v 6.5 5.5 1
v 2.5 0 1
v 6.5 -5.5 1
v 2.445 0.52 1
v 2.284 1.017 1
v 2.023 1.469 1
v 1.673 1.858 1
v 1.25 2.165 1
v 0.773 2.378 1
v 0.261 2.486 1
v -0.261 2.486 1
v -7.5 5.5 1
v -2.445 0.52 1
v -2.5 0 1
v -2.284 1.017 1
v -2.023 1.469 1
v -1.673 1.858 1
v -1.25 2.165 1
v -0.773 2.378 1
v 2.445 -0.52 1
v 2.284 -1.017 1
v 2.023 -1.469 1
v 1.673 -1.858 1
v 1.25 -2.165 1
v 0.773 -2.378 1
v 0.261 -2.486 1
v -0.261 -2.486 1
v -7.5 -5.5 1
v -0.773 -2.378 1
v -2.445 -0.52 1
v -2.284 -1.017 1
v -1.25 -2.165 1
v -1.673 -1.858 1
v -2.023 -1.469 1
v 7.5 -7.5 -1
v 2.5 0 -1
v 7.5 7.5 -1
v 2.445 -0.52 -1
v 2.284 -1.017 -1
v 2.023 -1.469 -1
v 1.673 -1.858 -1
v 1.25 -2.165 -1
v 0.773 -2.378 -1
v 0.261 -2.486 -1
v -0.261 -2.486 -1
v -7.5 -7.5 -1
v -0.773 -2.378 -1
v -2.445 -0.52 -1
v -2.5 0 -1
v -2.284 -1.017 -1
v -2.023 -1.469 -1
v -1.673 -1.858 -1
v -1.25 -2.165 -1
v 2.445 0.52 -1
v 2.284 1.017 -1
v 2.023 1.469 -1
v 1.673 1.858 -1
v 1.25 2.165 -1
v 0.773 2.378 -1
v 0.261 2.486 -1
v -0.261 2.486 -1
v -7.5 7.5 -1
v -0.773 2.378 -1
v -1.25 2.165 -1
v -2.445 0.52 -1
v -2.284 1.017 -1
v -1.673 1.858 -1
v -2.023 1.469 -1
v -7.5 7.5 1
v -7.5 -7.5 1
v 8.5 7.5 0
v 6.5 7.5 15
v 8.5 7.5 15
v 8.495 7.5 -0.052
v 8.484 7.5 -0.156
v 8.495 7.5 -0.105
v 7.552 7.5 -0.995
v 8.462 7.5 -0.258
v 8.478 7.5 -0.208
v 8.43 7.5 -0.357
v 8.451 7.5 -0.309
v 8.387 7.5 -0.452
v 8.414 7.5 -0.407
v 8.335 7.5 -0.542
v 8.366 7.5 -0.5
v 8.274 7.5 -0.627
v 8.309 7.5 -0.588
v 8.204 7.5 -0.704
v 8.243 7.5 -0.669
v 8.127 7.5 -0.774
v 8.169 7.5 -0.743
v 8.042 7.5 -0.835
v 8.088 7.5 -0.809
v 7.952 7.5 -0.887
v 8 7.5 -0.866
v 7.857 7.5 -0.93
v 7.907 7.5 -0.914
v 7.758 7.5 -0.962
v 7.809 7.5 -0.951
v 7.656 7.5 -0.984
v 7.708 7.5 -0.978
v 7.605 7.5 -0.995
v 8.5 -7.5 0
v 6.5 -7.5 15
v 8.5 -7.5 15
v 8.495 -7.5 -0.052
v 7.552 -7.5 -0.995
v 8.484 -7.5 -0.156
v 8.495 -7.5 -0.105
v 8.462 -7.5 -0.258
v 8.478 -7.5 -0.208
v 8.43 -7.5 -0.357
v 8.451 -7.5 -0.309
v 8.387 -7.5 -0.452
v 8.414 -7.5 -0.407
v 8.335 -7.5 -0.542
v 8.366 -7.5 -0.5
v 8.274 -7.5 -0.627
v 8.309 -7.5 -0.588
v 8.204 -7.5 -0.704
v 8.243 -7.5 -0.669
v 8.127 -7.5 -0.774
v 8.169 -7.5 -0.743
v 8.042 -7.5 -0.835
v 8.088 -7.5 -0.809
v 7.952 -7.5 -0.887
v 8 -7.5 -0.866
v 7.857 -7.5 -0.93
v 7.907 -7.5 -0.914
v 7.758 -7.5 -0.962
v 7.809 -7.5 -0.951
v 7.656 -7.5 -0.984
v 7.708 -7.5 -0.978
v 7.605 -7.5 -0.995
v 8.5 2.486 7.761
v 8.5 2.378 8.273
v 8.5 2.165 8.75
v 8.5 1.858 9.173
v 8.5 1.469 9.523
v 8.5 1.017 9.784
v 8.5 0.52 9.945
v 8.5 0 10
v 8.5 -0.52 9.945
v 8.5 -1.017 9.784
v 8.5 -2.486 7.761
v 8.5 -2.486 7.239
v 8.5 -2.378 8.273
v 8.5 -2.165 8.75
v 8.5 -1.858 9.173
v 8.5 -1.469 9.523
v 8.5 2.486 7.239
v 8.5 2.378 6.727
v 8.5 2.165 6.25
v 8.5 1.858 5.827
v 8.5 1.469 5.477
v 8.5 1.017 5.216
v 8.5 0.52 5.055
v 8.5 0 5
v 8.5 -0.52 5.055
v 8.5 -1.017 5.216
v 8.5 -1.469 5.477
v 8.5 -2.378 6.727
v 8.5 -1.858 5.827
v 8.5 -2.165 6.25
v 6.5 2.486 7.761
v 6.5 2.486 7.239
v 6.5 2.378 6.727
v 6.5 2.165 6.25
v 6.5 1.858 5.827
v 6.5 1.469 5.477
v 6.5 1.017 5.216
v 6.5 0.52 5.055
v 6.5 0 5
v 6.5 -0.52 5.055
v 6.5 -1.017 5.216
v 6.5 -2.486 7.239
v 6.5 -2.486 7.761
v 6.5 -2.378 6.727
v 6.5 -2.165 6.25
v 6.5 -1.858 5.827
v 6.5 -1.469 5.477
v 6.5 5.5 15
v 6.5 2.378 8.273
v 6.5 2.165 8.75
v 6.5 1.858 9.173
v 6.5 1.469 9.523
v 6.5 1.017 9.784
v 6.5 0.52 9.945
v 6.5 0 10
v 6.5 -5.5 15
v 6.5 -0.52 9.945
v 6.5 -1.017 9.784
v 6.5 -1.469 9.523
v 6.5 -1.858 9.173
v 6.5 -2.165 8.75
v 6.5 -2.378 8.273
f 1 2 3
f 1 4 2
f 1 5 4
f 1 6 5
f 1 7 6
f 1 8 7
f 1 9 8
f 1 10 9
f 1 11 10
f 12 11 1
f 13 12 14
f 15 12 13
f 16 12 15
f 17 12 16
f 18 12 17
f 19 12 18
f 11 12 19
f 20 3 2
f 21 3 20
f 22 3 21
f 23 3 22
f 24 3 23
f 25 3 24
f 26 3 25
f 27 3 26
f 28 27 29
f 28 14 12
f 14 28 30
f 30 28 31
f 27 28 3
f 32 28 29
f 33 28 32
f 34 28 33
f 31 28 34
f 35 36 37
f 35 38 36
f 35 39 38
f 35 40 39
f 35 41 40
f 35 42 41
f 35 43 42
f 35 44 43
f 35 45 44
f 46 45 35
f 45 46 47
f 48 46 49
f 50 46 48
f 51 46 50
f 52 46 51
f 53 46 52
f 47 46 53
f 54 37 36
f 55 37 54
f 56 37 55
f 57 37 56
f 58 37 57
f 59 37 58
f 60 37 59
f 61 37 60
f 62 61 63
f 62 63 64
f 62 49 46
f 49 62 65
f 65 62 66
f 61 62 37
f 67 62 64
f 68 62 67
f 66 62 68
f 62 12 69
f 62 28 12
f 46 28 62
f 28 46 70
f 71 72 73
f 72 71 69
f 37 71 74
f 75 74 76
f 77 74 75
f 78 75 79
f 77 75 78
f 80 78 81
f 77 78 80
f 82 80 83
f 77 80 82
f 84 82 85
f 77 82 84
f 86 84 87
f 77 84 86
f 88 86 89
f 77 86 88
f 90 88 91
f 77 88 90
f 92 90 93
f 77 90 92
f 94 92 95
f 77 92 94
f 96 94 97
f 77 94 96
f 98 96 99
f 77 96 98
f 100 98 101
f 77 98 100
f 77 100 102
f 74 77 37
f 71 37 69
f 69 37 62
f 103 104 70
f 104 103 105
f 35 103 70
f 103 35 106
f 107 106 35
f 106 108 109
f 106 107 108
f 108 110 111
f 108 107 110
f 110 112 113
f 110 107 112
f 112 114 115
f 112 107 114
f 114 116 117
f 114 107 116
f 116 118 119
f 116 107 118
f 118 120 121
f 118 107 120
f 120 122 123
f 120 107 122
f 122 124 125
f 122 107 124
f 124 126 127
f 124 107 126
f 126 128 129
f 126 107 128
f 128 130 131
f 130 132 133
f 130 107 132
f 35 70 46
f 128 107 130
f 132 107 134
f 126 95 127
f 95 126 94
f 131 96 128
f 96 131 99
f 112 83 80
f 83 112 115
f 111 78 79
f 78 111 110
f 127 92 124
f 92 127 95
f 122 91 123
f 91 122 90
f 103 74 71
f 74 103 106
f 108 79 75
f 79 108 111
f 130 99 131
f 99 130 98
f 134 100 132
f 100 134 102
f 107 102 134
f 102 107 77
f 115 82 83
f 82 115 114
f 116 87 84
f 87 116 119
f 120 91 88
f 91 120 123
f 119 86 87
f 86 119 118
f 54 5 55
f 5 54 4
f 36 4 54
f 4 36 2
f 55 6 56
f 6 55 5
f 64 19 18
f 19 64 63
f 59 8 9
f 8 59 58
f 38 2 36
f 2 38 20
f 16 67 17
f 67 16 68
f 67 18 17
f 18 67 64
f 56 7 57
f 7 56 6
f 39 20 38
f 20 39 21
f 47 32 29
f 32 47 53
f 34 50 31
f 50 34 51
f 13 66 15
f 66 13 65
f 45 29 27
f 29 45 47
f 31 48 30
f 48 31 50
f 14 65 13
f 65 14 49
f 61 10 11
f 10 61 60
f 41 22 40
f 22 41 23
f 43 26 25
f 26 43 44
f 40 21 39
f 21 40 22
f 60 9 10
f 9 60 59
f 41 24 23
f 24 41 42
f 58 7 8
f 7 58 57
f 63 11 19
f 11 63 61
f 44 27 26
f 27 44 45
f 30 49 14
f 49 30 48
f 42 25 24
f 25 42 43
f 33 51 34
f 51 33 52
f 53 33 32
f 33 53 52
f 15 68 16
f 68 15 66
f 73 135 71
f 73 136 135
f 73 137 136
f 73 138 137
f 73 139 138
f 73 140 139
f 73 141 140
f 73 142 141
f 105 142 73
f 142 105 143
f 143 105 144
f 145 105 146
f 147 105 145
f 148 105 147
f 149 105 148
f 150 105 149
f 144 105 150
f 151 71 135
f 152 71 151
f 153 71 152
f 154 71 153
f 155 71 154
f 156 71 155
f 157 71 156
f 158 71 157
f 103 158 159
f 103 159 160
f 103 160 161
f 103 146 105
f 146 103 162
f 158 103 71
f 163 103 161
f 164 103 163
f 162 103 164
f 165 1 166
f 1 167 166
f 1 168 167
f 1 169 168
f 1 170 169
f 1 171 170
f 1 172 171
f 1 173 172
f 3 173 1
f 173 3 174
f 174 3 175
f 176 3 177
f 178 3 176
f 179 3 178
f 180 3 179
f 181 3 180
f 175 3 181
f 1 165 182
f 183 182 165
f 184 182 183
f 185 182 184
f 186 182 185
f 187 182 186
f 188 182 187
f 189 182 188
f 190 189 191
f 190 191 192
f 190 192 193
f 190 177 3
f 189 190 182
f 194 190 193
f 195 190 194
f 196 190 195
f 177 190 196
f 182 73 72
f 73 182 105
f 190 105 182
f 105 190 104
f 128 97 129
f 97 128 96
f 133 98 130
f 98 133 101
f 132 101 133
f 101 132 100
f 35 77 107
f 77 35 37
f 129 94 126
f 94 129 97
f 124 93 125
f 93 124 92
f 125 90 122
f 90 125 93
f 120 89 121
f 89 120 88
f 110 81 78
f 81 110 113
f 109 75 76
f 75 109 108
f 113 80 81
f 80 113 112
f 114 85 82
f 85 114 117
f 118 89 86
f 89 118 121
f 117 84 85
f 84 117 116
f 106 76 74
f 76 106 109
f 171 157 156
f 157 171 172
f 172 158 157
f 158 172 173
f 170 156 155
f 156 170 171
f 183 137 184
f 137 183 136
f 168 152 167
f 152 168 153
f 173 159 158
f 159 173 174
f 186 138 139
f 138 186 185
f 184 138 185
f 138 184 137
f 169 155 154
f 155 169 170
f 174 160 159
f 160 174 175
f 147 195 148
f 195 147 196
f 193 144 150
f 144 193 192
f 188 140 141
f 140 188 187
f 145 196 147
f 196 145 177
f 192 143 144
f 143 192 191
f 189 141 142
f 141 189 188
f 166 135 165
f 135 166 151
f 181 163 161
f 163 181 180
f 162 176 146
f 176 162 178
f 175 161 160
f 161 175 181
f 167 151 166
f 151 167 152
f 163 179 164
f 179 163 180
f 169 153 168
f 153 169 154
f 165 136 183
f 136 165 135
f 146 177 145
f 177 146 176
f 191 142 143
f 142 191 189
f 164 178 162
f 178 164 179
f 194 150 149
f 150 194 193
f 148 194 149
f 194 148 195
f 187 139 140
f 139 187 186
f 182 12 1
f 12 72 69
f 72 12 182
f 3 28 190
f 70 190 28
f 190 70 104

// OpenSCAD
/////---Variables----//////

br_width = 15;
br_length = 15;
br_thickness = 2;
br_hole = 5;
br_support = "yes"; //[yes,no]
br_dual = "yes"; //[yes,no]

/////---Render---/////

bracket();

//cube([width,length,thickness],center=true);
//translate([width/2,0,length/2])rotate([0,90,0])cube([width,length,thickness],center=true);
//translate([width/2,0,0])rotate([90,0,0])cylinder(d=thickness,h=length,center=true, $fn=30);

/////---Modules---/////

module plate(w,l,h)
{
   difference()
   {
       union()
       {
           cube([br_width,br_length,br_thickness],center=true); 
           translate([br_width/2,0,0])rotate([90,0,0])cylinder(d=br_thickness,h=br_length,center=true, $fn=30);
           
       }
       cylinder(d=br_hole,h=br_thickness+1,center=true,$fn=30);
   }
}

module bracket()
{
    plate(br_width,br_length,br_thickness);
translate([br_width/2,0,br_width/2])rotate([0,90,0])plate(br_width,br_length,br_thickness);

    if (br_support == "yes")
    {
        hull()
        {
            translate([(br_width/2)-(br_thickness/2),(br_length/2)-(br_thickness/2),0])cube(br_thickness,center=true);
            translate([(-br_width/2)+(br_thickness/2),(br_length/2)-(br_thickness/2),0])cube(br_thickness,center=true);
            translate([br_width/2,(br_length/2)-(br_thickness/2),(br_width)-(br_thickness/2)])cube(br_thickness,center=true);
        }
    }
    mirror([0,1,0])
    {
       if (br_dual == "yes")
    {
        hull()
        {
            translate([(br_width/2)-(br_thickness/2),(br_length/2)-(br_thickness/2),0])cube(br_thickness,center=true);
            translate([(-br_width/2)+(br_thickness/2),(br_length/2)-(br_thickness/2),0])cube(br_thickness,center=true);
            translate([br_width/2,(br_length/2)-(br_thickness/2),(br_width)-(br_thickness/2)])cube(br_thickness,center=true);
        }
    } 
    }
}
